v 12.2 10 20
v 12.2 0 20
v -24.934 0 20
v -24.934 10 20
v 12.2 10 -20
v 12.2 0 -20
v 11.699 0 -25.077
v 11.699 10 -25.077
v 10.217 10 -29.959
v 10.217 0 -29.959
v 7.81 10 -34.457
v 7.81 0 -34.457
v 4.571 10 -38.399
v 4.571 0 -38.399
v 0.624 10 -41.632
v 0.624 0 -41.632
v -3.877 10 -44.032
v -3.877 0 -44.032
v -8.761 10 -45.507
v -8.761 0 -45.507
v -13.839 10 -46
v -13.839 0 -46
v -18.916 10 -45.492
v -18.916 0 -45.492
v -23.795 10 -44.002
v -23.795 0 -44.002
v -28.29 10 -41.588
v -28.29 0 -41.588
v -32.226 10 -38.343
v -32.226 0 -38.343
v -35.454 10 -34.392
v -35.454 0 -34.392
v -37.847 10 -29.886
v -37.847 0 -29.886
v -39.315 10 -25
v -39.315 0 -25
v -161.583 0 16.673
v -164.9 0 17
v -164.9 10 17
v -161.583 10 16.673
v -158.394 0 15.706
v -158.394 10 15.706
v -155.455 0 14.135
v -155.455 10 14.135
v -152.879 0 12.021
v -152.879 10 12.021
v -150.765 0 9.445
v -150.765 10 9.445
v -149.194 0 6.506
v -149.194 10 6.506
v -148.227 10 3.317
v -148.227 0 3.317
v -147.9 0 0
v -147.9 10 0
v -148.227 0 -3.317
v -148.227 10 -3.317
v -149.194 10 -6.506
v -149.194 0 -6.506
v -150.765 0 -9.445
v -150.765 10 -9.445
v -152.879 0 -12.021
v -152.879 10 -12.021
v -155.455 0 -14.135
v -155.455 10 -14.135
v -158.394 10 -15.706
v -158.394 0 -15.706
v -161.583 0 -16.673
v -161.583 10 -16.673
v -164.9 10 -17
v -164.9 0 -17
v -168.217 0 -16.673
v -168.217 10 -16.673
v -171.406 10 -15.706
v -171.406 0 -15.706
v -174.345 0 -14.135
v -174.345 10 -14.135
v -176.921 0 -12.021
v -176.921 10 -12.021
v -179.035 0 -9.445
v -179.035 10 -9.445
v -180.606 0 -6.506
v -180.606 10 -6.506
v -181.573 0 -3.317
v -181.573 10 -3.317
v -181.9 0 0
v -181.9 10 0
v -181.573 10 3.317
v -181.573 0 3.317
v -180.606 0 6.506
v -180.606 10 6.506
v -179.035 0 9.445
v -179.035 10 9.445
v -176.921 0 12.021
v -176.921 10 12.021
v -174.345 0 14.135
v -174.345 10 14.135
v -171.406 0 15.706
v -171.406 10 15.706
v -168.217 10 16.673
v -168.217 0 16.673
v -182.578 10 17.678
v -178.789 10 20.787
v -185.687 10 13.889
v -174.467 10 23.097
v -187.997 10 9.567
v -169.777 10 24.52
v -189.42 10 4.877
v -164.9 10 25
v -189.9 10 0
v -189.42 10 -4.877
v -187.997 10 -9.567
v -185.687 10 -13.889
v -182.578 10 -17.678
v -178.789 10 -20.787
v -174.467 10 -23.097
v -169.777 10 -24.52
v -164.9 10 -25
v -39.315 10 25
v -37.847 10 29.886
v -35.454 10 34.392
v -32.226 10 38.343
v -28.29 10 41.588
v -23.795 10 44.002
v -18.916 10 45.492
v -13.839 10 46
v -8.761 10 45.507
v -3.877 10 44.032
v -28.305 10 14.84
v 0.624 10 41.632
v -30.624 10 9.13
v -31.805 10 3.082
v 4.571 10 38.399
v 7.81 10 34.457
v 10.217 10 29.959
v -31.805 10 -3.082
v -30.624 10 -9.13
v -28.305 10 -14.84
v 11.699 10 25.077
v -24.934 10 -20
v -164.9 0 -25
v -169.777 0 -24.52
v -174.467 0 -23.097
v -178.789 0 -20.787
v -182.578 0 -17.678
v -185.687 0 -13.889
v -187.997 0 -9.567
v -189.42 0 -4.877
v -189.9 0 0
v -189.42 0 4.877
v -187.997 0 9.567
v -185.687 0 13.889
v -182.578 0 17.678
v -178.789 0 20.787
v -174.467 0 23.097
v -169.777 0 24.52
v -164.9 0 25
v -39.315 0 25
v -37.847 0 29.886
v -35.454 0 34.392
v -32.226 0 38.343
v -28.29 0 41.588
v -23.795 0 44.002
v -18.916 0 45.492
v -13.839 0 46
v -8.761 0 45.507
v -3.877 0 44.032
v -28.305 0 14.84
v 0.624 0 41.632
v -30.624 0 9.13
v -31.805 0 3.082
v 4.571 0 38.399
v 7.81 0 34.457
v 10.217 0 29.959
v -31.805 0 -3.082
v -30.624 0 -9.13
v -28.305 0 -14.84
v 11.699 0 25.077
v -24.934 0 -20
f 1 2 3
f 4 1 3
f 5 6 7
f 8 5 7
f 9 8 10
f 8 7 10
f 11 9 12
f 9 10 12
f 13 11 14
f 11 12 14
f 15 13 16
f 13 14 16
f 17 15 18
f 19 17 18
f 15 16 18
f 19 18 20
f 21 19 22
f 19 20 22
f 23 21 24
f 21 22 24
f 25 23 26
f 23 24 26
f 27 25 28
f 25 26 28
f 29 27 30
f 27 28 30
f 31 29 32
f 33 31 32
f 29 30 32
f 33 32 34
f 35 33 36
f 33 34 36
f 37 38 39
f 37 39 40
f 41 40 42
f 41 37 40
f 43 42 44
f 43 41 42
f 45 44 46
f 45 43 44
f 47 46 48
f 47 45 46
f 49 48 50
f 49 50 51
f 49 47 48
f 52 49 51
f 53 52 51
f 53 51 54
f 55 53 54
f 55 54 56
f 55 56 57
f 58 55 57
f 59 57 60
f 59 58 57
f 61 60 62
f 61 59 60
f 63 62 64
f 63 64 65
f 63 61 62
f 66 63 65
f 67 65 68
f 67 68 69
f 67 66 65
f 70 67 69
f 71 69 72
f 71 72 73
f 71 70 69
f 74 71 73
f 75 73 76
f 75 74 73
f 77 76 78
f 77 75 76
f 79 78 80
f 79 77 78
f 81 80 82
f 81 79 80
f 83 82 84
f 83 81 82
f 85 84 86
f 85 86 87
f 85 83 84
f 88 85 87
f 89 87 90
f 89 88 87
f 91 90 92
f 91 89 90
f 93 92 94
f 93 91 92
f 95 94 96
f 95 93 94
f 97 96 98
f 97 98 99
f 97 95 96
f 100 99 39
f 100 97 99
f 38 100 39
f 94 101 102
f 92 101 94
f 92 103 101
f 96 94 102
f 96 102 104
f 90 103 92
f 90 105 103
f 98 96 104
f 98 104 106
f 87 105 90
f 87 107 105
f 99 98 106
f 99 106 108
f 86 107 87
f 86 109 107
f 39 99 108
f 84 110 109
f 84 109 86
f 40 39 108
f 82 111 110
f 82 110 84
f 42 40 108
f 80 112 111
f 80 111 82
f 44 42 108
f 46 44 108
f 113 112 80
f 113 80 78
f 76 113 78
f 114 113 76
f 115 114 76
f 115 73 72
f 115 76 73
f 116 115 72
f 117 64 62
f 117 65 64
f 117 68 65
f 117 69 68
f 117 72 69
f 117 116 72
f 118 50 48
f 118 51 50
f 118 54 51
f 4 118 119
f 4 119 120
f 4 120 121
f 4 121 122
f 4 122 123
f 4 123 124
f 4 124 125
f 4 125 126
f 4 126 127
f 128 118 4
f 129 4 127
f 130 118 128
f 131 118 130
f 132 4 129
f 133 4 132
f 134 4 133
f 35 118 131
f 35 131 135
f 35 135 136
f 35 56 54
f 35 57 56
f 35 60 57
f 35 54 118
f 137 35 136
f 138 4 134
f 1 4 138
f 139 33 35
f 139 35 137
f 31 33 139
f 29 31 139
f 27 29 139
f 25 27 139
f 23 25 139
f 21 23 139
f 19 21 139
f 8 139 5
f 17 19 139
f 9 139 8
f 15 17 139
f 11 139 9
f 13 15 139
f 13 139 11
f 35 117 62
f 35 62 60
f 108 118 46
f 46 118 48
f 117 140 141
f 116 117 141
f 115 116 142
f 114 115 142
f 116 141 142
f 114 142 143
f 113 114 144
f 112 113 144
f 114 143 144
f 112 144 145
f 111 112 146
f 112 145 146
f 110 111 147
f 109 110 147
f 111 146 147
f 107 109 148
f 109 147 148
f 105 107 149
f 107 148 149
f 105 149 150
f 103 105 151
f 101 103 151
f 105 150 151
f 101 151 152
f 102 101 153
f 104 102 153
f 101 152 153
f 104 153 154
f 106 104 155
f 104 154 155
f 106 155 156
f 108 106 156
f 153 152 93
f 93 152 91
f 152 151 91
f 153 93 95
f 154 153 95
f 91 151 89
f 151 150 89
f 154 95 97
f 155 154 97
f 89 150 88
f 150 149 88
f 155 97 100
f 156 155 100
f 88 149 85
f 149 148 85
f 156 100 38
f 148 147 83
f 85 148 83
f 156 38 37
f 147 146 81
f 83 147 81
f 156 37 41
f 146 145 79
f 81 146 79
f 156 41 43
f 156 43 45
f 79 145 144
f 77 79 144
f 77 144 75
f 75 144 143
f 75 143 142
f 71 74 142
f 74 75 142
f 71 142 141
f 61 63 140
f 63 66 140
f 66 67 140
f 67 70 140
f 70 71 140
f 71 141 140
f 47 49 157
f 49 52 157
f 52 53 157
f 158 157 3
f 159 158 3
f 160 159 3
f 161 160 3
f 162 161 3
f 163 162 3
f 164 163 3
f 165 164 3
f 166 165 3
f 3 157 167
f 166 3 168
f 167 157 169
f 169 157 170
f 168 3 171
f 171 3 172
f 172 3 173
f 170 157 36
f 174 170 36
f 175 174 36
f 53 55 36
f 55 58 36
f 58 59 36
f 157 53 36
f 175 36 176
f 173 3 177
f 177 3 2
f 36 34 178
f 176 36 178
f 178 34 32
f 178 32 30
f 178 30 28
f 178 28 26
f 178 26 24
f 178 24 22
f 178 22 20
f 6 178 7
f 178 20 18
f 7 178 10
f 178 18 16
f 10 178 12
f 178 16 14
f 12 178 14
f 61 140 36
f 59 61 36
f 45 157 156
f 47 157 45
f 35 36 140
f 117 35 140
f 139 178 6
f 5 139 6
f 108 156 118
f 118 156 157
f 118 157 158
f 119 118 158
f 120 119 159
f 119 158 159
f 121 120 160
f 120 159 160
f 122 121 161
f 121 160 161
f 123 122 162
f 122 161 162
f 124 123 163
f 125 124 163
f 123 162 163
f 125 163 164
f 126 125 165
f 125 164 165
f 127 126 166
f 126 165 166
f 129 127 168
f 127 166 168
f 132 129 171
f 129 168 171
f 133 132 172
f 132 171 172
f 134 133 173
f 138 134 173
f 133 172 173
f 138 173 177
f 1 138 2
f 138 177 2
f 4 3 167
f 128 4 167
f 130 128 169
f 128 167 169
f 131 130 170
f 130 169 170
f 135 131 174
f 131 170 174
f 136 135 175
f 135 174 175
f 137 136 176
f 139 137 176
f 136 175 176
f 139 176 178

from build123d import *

# Parameters (mm, degrees)
SKETCH1_R           = 17
BOSS_EXTRUDE1_DEPTH = 10


with BuildPart() as part:
    # Sketch1 → Boss-Extrude1 (new body)
    with BuildSketch(Plane(origin=(0, 0, 0), x_dir=(1, 0, 0), z_dir=(0, 1, 0))):
        with BuildLine():
            Line((-24.933996638, 20), (12.2, 20))
            ThreePointArc((12.2, 20), (-11.288251879, 45.878391012), (-39.314701644, 25))
            Line((-39.314701644, 25), (-164.9, 25))
            ThreePointArc((-164.9, 25), (-189.9, 0), (-164.9, -25))
            Line((-164.9, -25), (-39.314701644, -25))
            ThreePointArc((-39.314701644, -25), (-11.288251879, -45.878391012), (12.2, -20))
            Line((12.2, -20), (-24.933996638, -20))
            ThreePointArc((-24.933996638, -20), (-31.954004645, 0), (-24.933996638, 20))
        make_face()
        with Locations(Location((-164.9, 0, 0), (0, 0, 270))):
            Circle(SKETCH1_R, mode=Mode.SUBTRACT)
    extrude(amount=BOSS_EXTRUDE1_DEPTH)


solid = part.part
